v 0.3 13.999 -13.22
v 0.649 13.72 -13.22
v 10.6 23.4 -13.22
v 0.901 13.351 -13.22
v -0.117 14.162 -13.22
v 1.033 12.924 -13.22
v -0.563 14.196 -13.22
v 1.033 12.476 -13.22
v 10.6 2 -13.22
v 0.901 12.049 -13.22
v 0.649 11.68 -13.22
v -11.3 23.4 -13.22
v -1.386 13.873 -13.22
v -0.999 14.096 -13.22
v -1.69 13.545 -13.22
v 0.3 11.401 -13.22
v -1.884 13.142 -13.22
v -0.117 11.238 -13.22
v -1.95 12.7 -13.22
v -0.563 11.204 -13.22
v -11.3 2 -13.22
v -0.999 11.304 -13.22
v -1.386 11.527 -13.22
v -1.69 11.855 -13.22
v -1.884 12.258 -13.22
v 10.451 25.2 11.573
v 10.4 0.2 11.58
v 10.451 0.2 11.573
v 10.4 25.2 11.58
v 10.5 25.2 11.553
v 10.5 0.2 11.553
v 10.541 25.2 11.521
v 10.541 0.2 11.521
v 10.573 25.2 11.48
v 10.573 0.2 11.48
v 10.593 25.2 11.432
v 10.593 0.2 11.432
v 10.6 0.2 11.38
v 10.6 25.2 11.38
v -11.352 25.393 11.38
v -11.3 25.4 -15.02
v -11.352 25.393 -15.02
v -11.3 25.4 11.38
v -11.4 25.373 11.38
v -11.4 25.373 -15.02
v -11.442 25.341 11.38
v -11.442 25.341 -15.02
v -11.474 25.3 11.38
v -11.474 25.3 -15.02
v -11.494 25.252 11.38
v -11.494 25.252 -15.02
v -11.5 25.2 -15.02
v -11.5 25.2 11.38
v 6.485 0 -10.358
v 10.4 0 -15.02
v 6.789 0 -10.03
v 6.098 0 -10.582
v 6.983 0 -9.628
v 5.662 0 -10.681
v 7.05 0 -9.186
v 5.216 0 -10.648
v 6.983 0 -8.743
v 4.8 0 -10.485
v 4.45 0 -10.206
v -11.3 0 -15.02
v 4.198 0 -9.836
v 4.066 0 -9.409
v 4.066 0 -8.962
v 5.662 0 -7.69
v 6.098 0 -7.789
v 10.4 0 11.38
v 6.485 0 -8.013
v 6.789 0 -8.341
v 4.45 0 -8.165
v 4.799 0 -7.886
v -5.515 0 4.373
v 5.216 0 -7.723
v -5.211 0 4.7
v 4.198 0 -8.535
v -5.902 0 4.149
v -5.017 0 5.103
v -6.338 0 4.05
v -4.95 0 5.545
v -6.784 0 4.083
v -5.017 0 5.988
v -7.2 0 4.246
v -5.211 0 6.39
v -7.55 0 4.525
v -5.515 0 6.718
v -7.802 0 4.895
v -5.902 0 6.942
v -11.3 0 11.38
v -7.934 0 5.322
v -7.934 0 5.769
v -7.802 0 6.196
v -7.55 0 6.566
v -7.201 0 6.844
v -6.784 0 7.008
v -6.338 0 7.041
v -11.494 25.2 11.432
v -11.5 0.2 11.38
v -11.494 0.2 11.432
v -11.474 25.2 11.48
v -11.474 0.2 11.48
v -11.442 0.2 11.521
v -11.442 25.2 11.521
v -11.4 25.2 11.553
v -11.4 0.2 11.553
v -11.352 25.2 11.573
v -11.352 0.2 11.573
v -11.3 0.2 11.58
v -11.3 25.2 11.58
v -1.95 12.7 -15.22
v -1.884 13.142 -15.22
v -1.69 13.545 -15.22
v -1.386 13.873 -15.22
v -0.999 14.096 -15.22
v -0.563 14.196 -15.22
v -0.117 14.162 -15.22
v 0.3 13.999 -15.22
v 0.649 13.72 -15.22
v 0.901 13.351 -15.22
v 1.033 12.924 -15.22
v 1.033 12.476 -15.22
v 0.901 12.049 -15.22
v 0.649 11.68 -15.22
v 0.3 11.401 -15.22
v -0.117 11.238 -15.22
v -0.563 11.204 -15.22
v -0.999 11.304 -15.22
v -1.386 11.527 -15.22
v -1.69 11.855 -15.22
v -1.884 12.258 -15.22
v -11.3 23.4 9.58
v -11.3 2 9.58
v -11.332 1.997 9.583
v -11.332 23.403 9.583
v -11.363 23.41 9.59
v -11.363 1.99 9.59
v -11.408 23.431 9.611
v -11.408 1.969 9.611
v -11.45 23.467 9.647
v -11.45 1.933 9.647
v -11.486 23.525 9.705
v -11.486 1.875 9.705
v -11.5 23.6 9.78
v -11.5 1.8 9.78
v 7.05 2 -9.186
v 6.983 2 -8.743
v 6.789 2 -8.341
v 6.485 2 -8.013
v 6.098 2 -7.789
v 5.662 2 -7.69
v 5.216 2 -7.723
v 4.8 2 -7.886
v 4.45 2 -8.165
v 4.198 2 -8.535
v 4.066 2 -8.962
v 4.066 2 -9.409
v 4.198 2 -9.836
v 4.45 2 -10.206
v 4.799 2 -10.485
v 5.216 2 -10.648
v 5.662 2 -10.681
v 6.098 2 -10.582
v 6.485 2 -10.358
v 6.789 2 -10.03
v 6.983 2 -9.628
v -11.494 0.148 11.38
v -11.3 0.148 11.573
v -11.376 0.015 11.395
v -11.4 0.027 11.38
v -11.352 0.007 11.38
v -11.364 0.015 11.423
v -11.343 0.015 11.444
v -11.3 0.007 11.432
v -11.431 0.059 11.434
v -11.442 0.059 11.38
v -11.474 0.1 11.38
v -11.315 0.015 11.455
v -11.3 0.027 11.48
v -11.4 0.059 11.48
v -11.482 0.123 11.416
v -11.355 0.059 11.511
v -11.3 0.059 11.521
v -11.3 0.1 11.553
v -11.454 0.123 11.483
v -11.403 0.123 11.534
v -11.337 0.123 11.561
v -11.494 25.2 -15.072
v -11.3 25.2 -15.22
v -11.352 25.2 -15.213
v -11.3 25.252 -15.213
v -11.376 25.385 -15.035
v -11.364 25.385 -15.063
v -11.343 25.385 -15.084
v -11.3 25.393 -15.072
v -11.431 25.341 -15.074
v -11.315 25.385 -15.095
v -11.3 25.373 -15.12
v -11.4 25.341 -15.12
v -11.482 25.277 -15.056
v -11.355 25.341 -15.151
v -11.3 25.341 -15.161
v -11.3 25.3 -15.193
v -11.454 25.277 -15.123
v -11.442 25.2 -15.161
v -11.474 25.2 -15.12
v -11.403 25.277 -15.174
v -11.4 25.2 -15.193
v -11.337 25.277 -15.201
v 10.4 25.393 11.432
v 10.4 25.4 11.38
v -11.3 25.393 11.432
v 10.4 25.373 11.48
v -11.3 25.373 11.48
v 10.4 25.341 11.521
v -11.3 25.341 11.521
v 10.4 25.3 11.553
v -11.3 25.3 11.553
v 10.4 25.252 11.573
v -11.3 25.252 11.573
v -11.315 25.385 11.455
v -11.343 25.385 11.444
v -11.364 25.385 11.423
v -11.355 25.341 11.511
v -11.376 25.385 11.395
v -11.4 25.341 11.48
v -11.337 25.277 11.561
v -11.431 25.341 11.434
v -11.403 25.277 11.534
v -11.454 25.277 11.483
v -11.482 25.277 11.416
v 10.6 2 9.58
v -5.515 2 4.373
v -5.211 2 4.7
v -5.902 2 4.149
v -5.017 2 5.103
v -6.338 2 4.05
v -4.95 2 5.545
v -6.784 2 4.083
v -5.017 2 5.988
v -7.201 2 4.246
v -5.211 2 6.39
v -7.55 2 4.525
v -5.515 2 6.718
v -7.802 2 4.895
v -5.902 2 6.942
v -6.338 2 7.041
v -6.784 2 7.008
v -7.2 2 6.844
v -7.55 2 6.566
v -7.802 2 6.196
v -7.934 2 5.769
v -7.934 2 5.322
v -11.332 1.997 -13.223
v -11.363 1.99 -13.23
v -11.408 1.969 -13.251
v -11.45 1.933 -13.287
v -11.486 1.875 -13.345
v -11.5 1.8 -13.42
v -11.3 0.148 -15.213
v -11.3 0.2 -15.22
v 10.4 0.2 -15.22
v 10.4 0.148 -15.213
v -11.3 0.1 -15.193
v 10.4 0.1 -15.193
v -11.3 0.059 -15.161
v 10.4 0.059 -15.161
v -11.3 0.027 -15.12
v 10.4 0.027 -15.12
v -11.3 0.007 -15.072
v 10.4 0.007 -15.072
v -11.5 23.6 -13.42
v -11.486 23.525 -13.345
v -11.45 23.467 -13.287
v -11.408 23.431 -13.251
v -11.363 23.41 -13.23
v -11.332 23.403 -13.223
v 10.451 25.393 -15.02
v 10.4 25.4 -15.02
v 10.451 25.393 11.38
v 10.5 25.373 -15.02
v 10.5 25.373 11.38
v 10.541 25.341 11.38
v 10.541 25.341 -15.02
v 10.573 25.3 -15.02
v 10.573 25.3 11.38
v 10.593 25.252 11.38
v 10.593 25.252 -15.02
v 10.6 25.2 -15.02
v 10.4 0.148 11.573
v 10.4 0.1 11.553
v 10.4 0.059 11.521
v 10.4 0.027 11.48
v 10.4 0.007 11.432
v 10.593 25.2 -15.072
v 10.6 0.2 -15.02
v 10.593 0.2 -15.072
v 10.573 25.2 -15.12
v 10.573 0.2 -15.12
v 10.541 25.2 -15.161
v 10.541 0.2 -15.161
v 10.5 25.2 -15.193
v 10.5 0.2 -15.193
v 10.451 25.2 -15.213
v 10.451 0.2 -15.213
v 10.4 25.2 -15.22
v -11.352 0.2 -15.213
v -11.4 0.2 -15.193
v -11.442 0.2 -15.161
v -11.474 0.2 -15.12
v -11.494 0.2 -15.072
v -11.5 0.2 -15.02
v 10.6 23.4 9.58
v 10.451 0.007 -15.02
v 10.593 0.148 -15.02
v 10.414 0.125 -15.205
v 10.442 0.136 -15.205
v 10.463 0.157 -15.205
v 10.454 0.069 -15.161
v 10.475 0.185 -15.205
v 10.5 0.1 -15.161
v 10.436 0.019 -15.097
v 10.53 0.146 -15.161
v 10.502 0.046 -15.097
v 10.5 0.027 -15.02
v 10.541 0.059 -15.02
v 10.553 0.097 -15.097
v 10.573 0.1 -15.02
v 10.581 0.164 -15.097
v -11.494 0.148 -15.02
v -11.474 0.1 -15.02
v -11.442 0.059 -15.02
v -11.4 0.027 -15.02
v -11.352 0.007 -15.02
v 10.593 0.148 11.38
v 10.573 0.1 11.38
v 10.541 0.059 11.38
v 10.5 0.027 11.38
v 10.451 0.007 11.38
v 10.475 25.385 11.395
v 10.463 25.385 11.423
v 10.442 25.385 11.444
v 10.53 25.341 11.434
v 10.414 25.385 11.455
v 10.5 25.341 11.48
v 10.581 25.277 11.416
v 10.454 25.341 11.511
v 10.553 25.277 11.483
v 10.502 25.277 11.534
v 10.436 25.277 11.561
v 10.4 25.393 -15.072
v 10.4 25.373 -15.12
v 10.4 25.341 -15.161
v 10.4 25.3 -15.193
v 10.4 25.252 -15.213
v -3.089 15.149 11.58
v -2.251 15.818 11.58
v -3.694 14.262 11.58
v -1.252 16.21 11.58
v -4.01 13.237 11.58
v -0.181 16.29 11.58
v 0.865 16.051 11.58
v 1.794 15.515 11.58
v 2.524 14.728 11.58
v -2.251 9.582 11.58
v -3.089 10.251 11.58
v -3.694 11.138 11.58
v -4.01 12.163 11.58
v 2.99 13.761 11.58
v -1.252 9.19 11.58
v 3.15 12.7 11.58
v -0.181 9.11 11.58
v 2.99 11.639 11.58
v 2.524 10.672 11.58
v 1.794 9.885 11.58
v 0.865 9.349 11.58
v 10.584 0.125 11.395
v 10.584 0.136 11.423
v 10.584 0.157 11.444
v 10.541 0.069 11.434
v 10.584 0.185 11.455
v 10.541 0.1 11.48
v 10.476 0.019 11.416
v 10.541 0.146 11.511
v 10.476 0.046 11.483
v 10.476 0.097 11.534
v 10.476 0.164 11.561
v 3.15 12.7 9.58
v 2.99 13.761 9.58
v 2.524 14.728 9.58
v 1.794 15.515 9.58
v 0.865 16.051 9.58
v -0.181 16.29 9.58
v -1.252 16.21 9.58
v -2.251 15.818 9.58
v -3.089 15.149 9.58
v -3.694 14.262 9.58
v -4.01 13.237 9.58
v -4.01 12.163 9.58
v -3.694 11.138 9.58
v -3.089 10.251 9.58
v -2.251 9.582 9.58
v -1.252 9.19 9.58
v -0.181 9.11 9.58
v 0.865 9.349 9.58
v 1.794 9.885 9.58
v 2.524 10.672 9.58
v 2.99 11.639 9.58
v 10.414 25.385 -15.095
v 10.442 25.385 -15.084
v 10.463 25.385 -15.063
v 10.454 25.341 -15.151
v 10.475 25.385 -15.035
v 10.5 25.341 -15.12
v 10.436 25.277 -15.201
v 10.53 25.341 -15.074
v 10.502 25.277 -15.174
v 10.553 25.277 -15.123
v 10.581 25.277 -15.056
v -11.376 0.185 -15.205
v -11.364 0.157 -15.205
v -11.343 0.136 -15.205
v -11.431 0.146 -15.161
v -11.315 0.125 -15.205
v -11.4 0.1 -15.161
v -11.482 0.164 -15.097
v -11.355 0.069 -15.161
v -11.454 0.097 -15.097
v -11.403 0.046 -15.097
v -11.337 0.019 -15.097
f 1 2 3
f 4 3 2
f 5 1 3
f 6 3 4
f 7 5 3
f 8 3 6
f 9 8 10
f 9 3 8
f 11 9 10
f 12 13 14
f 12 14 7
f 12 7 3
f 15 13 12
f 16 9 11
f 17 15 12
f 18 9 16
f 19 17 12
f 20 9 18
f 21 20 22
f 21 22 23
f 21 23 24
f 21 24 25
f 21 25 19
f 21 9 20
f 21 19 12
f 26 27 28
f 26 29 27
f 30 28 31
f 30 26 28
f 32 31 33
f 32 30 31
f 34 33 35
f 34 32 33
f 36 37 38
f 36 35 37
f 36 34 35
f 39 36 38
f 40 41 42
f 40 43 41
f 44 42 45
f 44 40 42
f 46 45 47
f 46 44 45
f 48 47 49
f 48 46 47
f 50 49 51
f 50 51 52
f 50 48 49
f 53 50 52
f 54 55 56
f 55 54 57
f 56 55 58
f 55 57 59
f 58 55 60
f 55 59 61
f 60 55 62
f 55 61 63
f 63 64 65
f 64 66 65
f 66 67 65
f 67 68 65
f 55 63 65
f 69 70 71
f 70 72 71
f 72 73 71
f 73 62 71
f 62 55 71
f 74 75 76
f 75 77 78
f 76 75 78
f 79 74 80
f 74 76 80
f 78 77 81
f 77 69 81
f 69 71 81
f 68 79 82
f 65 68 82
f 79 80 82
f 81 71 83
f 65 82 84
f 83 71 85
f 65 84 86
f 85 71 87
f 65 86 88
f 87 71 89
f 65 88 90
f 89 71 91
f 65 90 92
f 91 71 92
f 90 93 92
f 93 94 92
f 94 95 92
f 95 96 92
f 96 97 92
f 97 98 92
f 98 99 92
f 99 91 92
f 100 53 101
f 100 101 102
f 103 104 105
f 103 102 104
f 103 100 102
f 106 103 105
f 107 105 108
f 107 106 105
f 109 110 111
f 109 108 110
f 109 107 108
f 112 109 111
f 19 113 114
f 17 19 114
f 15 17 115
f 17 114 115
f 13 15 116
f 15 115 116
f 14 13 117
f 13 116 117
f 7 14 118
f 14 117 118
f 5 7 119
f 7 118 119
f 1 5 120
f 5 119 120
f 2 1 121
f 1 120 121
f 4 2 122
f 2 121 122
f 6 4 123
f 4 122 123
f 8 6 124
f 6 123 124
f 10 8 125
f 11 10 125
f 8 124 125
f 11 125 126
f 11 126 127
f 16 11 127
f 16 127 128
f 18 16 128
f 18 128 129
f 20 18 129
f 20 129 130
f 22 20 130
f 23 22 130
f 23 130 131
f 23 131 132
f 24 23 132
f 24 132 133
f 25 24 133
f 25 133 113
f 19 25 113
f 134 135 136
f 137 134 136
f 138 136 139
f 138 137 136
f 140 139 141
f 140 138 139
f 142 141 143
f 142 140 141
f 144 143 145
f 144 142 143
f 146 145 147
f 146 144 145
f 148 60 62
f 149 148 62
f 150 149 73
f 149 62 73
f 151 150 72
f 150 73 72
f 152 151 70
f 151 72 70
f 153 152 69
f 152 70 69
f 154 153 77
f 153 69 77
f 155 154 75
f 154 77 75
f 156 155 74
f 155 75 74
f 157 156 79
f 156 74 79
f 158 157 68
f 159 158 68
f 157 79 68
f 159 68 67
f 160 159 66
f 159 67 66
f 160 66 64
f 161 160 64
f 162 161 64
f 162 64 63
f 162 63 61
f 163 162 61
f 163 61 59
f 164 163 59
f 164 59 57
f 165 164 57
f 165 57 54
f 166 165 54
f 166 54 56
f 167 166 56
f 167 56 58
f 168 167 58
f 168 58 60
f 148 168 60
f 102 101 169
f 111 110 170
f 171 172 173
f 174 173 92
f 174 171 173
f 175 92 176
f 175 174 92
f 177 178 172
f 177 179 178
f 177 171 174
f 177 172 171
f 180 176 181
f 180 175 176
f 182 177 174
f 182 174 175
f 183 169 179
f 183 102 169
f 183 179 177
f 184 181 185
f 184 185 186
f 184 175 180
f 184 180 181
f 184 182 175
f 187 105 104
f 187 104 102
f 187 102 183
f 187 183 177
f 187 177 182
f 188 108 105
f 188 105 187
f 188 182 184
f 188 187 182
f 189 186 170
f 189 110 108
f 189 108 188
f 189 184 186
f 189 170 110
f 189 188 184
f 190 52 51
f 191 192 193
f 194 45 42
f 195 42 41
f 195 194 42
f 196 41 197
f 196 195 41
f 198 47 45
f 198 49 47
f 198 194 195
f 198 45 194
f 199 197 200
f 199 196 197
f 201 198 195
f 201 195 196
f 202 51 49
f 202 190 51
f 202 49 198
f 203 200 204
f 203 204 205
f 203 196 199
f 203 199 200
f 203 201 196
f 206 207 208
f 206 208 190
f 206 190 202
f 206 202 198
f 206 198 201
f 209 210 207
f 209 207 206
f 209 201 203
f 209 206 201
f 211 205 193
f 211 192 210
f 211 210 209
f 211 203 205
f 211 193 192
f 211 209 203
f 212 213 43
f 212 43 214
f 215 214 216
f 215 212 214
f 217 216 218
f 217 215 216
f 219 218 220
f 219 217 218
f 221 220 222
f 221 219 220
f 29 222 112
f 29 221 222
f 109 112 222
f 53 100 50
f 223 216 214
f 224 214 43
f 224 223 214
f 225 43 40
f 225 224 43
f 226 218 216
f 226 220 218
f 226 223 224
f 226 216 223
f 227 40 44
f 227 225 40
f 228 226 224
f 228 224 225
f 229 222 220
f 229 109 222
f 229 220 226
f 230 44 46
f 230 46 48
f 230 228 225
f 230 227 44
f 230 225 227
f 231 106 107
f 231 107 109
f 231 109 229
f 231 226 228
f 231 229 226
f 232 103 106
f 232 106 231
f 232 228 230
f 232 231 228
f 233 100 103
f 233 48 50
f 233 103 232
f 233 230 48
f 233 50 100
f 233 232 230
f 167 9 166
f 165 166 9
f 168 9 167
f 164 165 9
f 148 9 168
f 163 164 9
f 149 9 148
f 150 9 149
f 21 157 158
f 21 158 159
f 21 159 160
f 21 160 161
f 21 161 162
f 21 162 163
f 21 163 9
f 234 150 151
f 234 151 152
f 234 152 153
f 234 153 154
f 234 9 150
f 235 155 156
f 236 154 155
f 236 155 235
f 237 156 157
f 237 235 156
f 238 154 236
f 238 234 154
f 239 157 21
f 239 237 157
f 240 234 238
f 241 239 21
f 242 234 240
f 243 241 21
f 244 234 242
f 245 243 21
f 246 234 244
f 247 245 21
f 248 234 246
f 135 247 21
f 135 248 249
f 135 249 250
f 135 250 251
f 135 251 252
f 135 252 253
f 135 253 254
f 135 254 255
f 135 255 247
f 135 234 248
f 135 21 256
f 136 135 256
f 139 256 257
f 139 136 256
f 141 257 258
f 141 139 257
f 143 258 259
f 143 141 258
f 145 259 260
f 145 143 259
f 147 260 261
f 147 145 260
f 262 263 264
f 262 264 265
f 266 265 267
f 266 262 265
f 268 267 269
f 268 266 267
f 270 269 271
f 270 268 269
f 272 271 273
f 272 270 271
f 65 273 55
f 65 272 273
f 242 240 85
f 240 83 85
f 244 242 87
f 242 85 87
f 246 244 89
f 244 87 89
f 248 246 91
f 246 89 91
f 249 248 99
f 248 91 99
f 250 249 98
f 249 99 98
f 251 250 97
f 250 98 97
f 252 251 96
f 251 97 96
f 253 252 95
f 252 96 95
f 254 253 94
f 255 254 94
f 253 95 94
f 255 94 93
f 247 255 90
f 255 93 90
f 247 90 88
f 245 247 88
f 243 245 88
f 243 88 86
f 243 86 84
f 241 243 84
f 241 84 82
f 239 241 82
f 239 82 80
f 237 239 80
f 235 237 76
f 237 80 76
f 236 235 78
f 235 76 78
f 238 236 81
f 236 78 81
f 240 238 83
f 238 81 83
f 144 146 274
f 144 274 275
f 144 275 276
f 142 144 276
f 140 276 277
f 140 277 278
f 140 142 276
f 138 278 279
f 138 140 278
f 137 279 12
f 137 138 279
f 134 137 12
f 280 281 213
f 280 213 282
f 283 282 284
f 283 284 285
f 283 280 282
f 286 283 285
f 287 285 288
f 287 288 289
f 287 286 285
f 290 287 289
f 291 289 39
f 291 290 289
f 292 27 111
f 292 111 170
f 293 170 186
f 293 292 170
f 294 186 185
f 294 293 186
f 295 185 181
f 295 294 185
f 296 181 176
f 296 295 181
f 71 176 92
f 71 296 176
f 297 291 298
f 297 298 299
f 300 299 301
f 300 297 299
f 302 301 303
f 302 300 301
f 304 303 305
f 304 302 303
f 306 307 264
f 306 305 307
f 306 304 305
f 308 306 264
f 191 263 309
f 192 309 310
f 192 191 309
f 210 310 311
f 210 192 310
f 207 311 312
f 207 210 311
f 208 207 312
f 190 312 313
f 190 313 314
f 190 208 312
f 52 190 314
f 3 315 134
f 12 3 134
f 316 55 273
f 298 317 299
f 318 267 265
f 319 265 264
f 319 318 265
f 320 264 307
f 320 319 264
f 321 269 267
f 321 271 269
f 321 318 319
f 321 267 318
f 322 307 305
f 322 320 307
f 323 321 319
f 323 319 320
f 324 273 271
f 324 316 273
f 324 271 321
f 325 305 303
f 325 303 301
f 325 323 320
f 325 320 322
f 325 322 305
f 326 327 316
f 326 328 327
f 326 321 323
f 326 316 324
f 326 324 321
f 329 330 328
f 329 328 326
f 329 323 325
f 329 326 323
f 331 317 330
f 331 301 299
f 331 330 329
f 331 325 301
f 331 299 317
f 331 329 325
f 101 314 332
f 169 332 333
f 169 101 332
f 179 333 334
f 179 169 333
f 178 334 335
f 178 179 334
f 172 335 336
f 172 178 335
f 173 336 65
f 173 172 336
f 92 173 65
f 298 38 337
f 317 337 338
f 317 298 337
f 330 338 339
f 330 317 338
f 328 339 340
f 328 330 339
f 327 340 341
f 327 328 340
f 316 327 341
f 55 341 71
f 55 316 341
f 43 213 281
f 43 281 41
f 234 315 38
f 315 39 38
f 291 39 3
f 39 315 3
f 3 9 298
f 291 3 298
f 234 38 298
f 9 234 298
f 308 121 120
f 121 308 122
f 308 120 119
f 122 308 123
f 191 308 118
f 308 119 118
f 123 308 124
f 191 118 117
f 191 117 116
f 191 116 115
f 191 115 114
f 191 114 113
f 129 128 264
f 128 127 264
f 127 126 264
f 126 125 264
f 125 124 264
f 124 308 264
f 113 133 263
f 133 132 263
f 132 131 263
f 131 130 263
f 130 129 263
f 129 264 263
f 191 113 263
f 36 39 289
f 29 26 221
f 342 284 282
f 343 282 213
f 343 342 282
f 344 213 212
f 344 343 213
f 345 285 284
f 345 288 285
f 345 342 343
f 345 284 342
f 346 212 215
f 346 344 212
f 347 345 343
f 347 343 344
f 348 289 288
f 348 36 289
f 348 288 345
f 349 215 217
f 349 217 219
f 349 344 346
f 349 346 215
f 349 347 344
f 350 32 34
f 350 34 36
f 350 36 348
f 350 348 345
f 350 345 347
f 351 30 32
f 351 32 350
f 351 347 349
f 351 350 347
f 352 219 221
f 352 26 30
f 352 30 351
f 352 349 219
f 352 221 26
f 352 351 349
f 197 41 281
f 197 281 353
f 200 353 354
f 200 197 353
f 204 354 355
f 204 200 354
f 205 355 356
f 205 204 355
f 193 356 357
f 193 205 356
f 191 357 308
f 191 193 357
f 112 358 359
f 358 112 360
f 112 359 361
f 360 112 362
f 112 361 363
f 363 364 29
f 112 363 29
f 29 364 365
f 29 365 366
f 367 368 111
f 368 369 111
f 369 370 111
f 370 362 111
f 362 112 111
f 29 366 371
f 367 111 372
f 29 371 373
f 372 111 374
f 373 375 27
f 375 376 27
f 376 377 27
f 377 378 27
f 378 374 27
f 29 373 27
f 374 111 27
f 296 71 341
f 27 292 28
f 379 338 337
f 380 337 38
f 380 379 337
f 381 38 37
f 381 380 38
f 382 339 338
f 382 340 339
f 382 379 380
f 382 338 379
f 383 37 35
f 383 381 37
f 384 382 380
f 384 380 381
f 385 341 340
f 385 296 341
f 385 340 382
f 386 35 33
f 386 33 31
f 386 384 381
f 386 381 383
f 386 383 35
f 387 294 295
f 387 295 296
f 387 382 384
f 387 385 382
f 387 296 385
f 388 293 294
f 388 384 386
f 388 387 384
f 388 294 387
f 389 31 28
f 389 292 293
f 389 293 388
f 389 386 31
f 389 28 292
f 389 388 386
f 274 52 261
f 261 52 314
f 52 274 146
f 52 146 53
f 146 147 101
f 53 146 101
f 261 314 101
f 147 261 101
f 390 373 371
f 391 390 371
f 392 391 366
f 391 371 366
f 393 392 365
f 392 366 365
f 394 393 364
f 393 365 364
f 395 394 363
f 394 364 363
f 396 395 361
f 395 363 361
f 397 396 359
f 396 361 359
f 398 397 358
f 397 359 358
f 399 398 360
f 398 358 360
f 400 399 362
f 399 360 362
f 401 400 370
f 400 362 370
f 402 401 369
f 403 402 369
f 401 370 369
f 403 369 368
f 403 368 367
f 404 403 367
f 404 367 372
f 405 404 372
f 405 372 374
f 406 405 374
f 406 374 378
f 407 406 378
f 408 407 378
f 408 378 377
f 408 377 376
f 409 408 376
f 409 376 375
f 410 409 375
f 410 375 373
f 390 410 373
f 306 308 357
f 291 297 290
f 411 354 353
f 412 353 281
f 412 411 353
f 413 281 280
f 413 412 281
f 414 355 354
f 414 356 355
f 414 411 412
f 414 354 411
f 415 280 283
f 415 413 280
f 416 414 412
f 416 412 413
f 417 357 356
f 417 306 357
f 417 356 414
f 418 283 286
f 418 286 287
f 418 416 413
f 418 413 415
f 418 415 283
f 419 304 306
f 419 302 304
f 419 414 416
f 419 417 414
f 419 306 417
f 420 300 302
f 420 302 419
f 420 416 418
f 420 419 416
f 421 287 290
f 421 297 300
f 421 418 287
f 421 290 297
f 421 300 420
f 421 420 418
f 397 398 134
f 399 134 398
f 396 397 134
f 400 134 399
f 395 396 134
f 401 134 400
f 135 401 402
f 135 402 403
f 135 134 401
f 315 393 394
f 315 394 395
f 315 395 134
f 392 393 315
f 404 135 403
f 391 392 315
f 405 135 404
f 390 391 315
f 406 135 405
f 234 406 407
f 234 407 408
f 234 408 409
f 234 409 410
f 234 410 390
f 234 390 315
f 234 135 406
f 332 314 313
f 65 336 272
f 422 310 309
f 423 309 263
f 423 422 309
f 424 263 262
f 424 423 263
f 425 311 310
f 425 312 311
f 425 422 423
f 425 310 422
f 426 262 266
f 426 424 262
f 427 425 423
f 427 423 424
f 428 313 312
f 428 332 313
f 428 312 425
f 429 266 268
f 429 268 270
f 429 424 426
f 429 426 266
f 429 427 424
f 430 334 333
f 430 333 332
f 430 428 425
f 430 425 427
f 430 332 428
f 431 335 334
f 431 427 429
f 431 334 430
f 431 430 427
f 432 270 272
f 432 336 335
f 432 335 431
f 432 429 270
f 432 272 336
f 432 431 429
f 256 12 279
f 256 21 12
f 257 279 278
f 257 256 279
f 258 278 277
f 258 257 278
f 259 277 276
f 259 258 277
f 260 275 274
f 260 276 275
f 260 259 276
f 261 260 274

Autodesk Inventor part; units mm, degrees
ref_plane "YZ Plane" through (0, 0, 0) normal (1, 0, 0) x (0, 1, 0)
ref_plane "XZ Plane" through (0, 0, 0) normal (0, 1, 0) x (-1, 0, 0)
ref_plane "XY Plane" through (0, 0, 0) normal (0, 0, 1) x (1, 0, 0)
sketch "Sketch1" plane through (0, 0, 0) normal (0, 1, 0) x (-1, 0, 0)
  line L0 (11.5005, 11.58) -> (-10.5995, 11.58)
  line L1 (-10.5995, 11.58) -> (-10.5995, -15.22)
  line L2 (-10.5995, -15.22) -> (11.5005, -15.22)
  line L3 (11.5005, -15.22) -> (11.5005, 11.58)
  point P0 (0, 0)
  dimension "d0" = 22.1
  dimension "d1" = 26.8
extrude "Extrusion1" add sketch "Sketch1" along normal blind 25.4
shell "Shell1" thickness 2 removed faces 2 at (-11.5005, 8.4667, -6.2867) at (10.5995, 8.4667, 2.6466)
sketch "Sketch2" plane through (0, 0, 0) normal (0, -1, 0) x (1, 0, 0)
  line L0 (-11.5005, 11.58) -> (10.5995, 11.58) projected
  line L1 (-0.4505, 11.58) -> (-0.4505, -15.22)
  line L2 (10.5995, -15.22) -> (-11.5005, -15.22) projected
  circle A0 centre (-0.4505, -1.82) radius 9.5
  circle A1 centre (-6.4505, 5.5454) radius 1.5
  circle A2 centre (5.5495, -9.1855) radius 1.5
  point P0 (0, 0)
  dimension "d4" = 19
  dimension "d5" = 3
  dimension "d6" = 3
  dimension "d7" = 6
  dimension "d8" = 12
extrude "Extrusion2" cut sketch "Sketch2" against normal up to next contours A1 A0 | A0 A1 | A2 A0 | A0 A2
sketch "Sketch3" plane through (-11.5005, 0, 11.58) normal (0, 0, 1) x (1, 0, 0)
  line L0 (22.1, 0) -> (0, 0) projected
  line L1 (11.05, 0) -> (11.05, 25.4)
  line L2 (0, 25.4) -> (22.1, 25.4) projected
  circle A0 centre (11.05, 12.7) radius 3.6
  point P0 (11.5005, 0)
  dimension "d12" = 7.2
extrude "Extrusion3" cut sketch "Sketch3" against normal up to next
sketch "Sketch4" plane through (10.5995, 0, -15.22) normal (0, 0, -1) x (-1, 0, 0)
  line L0 (0, 25.4) -> (22.1, 25.4) projected
  line L1 (11.05, 25.4) -> (11.05, 0)
  line L2 (22.1, 0) -> (0, 0) projected
  circle A0 centre (11.05, 12.7) radius 1.5
  point P0 (10.5995, 0)
  dimension "d15" = 3
extrude "Extrusion4" cut sketch "Sketch4" against normal up to next
fillet "Fillet1" radius 0.2 16 edges at (-11.5005, 12.7, 11.58) (-0.4505, 0, 11.58) (10.5995, 12.7, 11.58) (10.5995, 0, -1.82) (-11.5005, 0, -1.82) (-0.4505, 0, -15.22) (10.5995, 12.7, -15.22) (-11.5005, 12.7, -15.22) (-0.4505, 25.4, -15.22) (-11.5005, 25.4, -1.82) (-0.4505, 25.4, 11.58) (10.5995, 25.4, -1.82) (-11.5005, 12.7, -13.22) (-11.5005, 2, -1.82) (-11.5005, 12.7, 9.58) (-11.5005, 23.4, -1.82)
properties part number "Solenoid_shell"
